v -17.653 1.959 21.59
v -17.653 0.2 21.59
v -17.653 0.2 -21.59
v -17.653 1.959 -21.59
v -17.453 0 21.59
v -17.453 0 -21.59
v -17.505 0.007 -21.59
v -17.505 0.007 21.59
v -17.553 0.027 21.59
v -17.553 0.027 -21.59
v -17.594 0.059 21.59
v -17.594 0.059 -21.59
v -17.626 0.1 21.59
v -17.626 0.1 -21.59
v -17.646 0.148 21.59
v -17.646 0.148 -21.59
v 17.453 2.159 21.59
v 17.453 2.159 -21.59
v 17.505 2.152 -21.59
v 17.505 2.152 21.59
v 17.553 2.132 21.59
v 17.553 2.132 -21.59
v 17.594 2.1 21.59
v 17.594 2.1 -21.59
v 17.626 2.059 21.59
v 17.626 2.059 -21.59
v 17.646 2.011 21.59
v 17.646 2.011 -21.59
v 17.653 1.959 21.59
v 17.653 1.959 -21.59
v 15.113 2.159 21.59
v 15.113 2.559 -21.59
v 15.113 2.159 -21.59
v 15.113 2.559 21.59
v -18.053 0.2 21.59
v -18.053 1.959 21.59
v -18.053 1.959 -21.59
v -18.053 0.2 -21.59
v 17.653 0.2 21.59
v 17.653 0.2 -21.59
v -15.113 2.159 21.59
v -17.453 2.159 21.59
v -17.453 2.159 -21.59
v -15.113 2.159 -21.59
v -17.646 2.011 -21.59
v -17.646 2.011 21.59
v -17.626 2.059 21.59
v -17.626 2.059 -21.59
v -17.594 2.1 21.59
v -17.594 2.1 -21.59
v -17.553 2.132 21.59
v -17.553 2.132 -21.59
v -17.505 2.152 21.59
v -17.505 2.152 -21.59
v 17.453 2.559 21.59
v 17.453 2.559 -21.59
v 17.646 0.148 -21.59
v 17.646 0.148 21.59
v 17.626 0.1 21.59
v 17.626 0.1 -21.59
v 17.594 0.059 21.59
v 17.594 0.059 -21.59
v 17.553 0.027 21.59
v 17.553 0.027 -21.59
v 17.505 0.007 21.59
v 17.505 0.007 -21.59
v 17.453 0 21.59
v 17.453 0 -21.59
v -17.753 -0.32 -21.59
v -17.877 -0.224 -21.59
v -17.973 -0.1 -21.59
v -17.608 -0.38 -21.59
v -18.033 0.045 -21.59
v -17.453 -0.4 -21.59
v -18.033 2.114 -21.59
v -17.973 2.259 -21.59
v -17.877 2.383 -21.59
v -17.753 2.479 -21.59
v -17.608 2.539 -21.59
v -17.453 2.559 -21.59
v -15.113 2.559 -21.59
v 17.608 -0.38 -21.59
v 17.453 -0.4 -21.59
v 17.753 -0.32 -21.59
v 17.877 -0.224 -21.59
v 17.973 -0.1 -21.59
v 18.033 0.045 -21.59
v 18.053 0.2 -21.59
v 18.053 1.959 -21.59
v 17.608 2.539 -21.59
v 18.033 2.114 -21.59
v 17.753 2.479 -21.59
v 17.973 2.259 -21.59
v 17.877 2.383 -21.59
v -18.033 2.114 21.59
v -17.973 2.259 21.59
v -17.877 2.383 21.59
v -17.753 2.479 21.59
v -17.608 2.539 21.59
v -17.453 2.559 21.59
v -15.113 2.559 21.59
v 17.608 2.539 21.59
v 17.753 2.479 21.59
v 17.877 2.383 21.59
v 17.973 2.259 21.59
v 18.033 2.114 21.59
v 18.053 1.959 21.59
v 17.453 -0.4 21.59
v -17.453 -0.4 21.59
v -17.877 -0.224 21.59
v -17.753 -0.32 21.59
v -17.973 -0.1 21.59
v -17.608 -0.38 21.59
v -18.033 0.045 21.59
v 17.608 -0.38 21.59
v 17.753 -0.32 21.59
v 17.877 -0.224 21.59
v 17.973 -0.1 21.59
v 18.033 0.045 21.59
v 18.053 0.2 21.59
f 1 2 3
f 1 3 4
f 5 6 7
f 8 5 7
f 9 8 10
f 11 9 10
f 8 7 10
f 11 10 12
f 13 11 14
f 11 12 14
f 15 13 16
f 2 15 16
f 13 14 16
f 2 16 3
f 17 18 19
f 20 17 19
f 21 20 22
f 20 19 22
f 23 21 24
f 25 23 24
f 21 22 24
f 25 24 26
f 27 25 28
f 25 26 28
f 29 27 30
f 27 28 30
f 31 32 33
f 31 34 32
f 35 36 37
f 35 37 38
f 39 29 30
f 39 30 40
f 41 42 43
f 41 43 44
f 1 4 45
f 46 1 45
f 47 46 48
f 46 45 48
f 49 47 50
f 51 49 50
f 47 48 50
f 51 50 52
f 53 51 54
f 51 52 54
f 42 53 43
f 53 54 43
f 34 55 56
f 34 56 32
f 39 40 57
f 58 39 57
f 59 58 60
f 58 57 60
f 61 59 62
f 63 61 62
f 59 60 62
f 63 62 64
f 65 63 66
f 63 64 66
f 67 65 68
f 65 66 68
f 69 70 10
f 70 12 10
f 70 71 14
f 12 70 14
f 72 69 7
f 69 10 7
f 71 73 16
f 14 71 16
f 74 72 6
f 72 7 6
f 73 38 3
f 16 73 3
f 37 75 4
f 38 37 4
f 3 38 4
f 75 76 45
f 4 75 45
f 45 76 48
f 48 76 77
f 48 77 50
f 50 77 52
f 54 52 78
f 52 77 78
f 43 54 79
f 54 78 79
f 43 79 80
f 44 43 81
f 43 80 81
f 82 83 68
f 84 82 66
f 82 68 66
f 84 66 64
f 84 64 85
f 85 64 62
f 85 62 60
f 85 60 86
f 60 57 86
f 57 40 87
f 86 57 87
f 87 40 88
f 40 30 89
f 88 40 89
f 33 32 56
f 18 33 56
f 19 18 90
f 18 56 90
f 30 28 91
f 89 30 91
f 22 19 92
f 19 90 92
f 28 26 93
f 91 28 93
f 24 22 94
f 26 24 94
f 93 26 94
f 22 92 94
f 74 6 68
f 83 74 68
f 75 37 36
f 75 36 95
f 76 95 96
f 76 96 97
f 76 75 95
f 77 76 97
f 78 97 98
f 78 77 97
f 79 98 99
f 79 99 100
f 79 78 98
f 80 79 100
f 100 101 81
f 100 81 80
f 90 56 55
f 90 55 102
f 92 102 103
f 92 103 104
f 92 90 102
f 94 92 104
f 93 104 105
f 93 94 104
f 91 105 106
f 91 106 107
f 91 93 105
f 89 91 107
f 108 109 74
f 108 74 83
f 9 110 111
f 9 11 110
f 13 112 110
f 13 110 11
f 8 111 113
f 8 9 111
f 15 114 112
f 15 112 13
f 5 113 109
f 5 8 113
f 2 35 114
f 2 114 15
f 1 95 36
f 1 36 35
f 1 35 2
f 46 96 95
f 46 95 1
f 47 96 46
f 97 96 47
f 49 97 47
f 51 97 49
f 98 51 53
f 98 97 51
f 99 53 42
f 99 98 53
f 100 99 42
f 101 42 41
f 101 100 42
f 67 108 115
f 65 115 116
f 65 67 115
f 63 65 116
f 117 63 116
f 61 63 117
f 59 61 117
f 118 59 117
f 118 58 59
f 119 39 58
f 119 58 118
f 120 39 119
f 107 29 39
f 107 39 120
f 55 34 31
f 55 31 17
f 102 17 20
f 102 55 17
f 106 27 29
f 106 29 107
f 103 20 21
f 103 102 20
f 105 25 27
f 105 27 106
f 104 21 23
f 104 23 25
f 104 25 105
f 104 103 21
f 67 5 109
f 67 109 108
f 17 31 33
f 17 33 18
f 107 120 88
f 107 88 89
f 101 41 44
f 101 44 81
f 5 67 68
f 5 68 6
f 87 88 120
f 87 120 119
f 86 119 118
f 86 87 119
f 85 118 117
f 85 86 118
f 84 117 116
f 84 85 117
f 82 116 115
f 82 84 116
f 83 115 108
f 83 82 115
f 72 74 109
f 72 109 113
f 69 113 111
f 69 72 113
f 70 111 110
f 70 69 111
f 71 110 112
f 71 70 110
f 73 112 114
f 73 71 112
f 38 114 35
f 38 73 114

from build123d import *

# Parameters (mm, degrees)
EXTRUDE_THIN3_DEPTH    = 21.59
CONVERT_SOLID1_START   = -21.59
CONVERT_SOLID1_DEPTH   = 43.18
CONVERT_SOLID1_2_DEPTH = 43.18


# Read off the part's stored shape, not the designer's step: Convert-Solid1
with BuildPart() as part:
    # Sketch6 → Extrude-Thin3 (new, symmetric)
    with BuildSketch(Plane.XY):
        Polygon((15.113, 2.159), (17.653, 2.159), (17.653, 0), (-17.653, 0), (-17.653, 2.159), (-15.113, 2.159), (-15.113, 2.559), (-18.053, 2.559), (-18.053, -0.4), (18.053, -0.4), (18.053, 2.559), (15.113, 2.559), align=None)
    extrude(amount=EXTRUDE_THIN3_DEPTH, both=True)

    # Convert-Solid1 outline → Convert-Solid1 (cut)
    with BuildSketch(Plane.XY.offset(CONVERT_SOLID1_START)):
        with BuildLine():
            Line((-18.053, 2.559), (-18.053, 1.959))
            ThreePointArc((-18.053, 1.959), (-17.877264, 2.383264), (-17.453, 2.559))
            Line((-17.453, 2.559), (-18.053, 2.559))
        make_face()
        with BuildLine():
            Line((-18.053, -0.4), (-17.453, -0.4))
            ThreePointArc((-17.453, -0.4), (-17.877264, -0.224264), (-18.053, 0.2))
            Line((-18.053, 0.2), (-18.053, -0.4))
        make_face()
        with BuildLine():
            Line((18.053, -0.4), (18.053, 0.2))
            ThreePointArc((18.053, 0.2), (17.877264, -0.224264), (17.453, -0.4))
            Line((17.453, -0.4), (18.053, -0.4))
        make_face()
        with BuildLine():
            ThreePointArc((17.453, 2.559), (17.877264, 2.383264), (18.053, 1.959))
            Line((18.053, 1.959), (18.053, 2.559))
            Line((18.053, 2.559), (17.453, 2.559))
        make_face()
    extrude(amount=CONVERT_SOLID1_DEPTH, mode=Mode.SUBTRACT)

    # Convert-Solid1 2 outline → Convert-Solid1 2 (add)
    with BuildSketch(Plane.XY.offset(CONVERT_SOLID1_START)):
        with BuildLine():
            Line((-17.653, 2.159), (-17.653, 1.959))
            ThreePointArc((-17.653, 1.959), (-17.594421, 2.100421), (-17.453, 2.159))
            Line((-17.453, 2.159), (-17.653, 2.159))
        make_face()
        with BuildLine():
            Line((-17.653, 0), (-17.453, 0))
            ThreePointArc((-17.453, 0), (-17.594421, 0.058579), (-17.653, 0.2))
            Line((-17.653, 0.2), (-17.653, 0))
        make_face()
        with BuildLine():
            Line((17.653, 0), (17.653, 0.2))
            ThreePointArc((17.653, 0.2), (17.594421, 0.058579), (17.453, 0))
            Line((17.453, 0), (17.653, 0))
        make_face()
        with BuildLine():
            ThreePointArc((17.453, 2.159), (17.594421, 2.100421), (17.653, 1.959))
            Line((17.653, 1.959), (17.653, 2.159))
            Line((17.653, 2.159), (17.453, 2.159))
        make_face()
    extrude(amount=CONVERT_SOLID1_2_DEPTH)


solid = part.part
